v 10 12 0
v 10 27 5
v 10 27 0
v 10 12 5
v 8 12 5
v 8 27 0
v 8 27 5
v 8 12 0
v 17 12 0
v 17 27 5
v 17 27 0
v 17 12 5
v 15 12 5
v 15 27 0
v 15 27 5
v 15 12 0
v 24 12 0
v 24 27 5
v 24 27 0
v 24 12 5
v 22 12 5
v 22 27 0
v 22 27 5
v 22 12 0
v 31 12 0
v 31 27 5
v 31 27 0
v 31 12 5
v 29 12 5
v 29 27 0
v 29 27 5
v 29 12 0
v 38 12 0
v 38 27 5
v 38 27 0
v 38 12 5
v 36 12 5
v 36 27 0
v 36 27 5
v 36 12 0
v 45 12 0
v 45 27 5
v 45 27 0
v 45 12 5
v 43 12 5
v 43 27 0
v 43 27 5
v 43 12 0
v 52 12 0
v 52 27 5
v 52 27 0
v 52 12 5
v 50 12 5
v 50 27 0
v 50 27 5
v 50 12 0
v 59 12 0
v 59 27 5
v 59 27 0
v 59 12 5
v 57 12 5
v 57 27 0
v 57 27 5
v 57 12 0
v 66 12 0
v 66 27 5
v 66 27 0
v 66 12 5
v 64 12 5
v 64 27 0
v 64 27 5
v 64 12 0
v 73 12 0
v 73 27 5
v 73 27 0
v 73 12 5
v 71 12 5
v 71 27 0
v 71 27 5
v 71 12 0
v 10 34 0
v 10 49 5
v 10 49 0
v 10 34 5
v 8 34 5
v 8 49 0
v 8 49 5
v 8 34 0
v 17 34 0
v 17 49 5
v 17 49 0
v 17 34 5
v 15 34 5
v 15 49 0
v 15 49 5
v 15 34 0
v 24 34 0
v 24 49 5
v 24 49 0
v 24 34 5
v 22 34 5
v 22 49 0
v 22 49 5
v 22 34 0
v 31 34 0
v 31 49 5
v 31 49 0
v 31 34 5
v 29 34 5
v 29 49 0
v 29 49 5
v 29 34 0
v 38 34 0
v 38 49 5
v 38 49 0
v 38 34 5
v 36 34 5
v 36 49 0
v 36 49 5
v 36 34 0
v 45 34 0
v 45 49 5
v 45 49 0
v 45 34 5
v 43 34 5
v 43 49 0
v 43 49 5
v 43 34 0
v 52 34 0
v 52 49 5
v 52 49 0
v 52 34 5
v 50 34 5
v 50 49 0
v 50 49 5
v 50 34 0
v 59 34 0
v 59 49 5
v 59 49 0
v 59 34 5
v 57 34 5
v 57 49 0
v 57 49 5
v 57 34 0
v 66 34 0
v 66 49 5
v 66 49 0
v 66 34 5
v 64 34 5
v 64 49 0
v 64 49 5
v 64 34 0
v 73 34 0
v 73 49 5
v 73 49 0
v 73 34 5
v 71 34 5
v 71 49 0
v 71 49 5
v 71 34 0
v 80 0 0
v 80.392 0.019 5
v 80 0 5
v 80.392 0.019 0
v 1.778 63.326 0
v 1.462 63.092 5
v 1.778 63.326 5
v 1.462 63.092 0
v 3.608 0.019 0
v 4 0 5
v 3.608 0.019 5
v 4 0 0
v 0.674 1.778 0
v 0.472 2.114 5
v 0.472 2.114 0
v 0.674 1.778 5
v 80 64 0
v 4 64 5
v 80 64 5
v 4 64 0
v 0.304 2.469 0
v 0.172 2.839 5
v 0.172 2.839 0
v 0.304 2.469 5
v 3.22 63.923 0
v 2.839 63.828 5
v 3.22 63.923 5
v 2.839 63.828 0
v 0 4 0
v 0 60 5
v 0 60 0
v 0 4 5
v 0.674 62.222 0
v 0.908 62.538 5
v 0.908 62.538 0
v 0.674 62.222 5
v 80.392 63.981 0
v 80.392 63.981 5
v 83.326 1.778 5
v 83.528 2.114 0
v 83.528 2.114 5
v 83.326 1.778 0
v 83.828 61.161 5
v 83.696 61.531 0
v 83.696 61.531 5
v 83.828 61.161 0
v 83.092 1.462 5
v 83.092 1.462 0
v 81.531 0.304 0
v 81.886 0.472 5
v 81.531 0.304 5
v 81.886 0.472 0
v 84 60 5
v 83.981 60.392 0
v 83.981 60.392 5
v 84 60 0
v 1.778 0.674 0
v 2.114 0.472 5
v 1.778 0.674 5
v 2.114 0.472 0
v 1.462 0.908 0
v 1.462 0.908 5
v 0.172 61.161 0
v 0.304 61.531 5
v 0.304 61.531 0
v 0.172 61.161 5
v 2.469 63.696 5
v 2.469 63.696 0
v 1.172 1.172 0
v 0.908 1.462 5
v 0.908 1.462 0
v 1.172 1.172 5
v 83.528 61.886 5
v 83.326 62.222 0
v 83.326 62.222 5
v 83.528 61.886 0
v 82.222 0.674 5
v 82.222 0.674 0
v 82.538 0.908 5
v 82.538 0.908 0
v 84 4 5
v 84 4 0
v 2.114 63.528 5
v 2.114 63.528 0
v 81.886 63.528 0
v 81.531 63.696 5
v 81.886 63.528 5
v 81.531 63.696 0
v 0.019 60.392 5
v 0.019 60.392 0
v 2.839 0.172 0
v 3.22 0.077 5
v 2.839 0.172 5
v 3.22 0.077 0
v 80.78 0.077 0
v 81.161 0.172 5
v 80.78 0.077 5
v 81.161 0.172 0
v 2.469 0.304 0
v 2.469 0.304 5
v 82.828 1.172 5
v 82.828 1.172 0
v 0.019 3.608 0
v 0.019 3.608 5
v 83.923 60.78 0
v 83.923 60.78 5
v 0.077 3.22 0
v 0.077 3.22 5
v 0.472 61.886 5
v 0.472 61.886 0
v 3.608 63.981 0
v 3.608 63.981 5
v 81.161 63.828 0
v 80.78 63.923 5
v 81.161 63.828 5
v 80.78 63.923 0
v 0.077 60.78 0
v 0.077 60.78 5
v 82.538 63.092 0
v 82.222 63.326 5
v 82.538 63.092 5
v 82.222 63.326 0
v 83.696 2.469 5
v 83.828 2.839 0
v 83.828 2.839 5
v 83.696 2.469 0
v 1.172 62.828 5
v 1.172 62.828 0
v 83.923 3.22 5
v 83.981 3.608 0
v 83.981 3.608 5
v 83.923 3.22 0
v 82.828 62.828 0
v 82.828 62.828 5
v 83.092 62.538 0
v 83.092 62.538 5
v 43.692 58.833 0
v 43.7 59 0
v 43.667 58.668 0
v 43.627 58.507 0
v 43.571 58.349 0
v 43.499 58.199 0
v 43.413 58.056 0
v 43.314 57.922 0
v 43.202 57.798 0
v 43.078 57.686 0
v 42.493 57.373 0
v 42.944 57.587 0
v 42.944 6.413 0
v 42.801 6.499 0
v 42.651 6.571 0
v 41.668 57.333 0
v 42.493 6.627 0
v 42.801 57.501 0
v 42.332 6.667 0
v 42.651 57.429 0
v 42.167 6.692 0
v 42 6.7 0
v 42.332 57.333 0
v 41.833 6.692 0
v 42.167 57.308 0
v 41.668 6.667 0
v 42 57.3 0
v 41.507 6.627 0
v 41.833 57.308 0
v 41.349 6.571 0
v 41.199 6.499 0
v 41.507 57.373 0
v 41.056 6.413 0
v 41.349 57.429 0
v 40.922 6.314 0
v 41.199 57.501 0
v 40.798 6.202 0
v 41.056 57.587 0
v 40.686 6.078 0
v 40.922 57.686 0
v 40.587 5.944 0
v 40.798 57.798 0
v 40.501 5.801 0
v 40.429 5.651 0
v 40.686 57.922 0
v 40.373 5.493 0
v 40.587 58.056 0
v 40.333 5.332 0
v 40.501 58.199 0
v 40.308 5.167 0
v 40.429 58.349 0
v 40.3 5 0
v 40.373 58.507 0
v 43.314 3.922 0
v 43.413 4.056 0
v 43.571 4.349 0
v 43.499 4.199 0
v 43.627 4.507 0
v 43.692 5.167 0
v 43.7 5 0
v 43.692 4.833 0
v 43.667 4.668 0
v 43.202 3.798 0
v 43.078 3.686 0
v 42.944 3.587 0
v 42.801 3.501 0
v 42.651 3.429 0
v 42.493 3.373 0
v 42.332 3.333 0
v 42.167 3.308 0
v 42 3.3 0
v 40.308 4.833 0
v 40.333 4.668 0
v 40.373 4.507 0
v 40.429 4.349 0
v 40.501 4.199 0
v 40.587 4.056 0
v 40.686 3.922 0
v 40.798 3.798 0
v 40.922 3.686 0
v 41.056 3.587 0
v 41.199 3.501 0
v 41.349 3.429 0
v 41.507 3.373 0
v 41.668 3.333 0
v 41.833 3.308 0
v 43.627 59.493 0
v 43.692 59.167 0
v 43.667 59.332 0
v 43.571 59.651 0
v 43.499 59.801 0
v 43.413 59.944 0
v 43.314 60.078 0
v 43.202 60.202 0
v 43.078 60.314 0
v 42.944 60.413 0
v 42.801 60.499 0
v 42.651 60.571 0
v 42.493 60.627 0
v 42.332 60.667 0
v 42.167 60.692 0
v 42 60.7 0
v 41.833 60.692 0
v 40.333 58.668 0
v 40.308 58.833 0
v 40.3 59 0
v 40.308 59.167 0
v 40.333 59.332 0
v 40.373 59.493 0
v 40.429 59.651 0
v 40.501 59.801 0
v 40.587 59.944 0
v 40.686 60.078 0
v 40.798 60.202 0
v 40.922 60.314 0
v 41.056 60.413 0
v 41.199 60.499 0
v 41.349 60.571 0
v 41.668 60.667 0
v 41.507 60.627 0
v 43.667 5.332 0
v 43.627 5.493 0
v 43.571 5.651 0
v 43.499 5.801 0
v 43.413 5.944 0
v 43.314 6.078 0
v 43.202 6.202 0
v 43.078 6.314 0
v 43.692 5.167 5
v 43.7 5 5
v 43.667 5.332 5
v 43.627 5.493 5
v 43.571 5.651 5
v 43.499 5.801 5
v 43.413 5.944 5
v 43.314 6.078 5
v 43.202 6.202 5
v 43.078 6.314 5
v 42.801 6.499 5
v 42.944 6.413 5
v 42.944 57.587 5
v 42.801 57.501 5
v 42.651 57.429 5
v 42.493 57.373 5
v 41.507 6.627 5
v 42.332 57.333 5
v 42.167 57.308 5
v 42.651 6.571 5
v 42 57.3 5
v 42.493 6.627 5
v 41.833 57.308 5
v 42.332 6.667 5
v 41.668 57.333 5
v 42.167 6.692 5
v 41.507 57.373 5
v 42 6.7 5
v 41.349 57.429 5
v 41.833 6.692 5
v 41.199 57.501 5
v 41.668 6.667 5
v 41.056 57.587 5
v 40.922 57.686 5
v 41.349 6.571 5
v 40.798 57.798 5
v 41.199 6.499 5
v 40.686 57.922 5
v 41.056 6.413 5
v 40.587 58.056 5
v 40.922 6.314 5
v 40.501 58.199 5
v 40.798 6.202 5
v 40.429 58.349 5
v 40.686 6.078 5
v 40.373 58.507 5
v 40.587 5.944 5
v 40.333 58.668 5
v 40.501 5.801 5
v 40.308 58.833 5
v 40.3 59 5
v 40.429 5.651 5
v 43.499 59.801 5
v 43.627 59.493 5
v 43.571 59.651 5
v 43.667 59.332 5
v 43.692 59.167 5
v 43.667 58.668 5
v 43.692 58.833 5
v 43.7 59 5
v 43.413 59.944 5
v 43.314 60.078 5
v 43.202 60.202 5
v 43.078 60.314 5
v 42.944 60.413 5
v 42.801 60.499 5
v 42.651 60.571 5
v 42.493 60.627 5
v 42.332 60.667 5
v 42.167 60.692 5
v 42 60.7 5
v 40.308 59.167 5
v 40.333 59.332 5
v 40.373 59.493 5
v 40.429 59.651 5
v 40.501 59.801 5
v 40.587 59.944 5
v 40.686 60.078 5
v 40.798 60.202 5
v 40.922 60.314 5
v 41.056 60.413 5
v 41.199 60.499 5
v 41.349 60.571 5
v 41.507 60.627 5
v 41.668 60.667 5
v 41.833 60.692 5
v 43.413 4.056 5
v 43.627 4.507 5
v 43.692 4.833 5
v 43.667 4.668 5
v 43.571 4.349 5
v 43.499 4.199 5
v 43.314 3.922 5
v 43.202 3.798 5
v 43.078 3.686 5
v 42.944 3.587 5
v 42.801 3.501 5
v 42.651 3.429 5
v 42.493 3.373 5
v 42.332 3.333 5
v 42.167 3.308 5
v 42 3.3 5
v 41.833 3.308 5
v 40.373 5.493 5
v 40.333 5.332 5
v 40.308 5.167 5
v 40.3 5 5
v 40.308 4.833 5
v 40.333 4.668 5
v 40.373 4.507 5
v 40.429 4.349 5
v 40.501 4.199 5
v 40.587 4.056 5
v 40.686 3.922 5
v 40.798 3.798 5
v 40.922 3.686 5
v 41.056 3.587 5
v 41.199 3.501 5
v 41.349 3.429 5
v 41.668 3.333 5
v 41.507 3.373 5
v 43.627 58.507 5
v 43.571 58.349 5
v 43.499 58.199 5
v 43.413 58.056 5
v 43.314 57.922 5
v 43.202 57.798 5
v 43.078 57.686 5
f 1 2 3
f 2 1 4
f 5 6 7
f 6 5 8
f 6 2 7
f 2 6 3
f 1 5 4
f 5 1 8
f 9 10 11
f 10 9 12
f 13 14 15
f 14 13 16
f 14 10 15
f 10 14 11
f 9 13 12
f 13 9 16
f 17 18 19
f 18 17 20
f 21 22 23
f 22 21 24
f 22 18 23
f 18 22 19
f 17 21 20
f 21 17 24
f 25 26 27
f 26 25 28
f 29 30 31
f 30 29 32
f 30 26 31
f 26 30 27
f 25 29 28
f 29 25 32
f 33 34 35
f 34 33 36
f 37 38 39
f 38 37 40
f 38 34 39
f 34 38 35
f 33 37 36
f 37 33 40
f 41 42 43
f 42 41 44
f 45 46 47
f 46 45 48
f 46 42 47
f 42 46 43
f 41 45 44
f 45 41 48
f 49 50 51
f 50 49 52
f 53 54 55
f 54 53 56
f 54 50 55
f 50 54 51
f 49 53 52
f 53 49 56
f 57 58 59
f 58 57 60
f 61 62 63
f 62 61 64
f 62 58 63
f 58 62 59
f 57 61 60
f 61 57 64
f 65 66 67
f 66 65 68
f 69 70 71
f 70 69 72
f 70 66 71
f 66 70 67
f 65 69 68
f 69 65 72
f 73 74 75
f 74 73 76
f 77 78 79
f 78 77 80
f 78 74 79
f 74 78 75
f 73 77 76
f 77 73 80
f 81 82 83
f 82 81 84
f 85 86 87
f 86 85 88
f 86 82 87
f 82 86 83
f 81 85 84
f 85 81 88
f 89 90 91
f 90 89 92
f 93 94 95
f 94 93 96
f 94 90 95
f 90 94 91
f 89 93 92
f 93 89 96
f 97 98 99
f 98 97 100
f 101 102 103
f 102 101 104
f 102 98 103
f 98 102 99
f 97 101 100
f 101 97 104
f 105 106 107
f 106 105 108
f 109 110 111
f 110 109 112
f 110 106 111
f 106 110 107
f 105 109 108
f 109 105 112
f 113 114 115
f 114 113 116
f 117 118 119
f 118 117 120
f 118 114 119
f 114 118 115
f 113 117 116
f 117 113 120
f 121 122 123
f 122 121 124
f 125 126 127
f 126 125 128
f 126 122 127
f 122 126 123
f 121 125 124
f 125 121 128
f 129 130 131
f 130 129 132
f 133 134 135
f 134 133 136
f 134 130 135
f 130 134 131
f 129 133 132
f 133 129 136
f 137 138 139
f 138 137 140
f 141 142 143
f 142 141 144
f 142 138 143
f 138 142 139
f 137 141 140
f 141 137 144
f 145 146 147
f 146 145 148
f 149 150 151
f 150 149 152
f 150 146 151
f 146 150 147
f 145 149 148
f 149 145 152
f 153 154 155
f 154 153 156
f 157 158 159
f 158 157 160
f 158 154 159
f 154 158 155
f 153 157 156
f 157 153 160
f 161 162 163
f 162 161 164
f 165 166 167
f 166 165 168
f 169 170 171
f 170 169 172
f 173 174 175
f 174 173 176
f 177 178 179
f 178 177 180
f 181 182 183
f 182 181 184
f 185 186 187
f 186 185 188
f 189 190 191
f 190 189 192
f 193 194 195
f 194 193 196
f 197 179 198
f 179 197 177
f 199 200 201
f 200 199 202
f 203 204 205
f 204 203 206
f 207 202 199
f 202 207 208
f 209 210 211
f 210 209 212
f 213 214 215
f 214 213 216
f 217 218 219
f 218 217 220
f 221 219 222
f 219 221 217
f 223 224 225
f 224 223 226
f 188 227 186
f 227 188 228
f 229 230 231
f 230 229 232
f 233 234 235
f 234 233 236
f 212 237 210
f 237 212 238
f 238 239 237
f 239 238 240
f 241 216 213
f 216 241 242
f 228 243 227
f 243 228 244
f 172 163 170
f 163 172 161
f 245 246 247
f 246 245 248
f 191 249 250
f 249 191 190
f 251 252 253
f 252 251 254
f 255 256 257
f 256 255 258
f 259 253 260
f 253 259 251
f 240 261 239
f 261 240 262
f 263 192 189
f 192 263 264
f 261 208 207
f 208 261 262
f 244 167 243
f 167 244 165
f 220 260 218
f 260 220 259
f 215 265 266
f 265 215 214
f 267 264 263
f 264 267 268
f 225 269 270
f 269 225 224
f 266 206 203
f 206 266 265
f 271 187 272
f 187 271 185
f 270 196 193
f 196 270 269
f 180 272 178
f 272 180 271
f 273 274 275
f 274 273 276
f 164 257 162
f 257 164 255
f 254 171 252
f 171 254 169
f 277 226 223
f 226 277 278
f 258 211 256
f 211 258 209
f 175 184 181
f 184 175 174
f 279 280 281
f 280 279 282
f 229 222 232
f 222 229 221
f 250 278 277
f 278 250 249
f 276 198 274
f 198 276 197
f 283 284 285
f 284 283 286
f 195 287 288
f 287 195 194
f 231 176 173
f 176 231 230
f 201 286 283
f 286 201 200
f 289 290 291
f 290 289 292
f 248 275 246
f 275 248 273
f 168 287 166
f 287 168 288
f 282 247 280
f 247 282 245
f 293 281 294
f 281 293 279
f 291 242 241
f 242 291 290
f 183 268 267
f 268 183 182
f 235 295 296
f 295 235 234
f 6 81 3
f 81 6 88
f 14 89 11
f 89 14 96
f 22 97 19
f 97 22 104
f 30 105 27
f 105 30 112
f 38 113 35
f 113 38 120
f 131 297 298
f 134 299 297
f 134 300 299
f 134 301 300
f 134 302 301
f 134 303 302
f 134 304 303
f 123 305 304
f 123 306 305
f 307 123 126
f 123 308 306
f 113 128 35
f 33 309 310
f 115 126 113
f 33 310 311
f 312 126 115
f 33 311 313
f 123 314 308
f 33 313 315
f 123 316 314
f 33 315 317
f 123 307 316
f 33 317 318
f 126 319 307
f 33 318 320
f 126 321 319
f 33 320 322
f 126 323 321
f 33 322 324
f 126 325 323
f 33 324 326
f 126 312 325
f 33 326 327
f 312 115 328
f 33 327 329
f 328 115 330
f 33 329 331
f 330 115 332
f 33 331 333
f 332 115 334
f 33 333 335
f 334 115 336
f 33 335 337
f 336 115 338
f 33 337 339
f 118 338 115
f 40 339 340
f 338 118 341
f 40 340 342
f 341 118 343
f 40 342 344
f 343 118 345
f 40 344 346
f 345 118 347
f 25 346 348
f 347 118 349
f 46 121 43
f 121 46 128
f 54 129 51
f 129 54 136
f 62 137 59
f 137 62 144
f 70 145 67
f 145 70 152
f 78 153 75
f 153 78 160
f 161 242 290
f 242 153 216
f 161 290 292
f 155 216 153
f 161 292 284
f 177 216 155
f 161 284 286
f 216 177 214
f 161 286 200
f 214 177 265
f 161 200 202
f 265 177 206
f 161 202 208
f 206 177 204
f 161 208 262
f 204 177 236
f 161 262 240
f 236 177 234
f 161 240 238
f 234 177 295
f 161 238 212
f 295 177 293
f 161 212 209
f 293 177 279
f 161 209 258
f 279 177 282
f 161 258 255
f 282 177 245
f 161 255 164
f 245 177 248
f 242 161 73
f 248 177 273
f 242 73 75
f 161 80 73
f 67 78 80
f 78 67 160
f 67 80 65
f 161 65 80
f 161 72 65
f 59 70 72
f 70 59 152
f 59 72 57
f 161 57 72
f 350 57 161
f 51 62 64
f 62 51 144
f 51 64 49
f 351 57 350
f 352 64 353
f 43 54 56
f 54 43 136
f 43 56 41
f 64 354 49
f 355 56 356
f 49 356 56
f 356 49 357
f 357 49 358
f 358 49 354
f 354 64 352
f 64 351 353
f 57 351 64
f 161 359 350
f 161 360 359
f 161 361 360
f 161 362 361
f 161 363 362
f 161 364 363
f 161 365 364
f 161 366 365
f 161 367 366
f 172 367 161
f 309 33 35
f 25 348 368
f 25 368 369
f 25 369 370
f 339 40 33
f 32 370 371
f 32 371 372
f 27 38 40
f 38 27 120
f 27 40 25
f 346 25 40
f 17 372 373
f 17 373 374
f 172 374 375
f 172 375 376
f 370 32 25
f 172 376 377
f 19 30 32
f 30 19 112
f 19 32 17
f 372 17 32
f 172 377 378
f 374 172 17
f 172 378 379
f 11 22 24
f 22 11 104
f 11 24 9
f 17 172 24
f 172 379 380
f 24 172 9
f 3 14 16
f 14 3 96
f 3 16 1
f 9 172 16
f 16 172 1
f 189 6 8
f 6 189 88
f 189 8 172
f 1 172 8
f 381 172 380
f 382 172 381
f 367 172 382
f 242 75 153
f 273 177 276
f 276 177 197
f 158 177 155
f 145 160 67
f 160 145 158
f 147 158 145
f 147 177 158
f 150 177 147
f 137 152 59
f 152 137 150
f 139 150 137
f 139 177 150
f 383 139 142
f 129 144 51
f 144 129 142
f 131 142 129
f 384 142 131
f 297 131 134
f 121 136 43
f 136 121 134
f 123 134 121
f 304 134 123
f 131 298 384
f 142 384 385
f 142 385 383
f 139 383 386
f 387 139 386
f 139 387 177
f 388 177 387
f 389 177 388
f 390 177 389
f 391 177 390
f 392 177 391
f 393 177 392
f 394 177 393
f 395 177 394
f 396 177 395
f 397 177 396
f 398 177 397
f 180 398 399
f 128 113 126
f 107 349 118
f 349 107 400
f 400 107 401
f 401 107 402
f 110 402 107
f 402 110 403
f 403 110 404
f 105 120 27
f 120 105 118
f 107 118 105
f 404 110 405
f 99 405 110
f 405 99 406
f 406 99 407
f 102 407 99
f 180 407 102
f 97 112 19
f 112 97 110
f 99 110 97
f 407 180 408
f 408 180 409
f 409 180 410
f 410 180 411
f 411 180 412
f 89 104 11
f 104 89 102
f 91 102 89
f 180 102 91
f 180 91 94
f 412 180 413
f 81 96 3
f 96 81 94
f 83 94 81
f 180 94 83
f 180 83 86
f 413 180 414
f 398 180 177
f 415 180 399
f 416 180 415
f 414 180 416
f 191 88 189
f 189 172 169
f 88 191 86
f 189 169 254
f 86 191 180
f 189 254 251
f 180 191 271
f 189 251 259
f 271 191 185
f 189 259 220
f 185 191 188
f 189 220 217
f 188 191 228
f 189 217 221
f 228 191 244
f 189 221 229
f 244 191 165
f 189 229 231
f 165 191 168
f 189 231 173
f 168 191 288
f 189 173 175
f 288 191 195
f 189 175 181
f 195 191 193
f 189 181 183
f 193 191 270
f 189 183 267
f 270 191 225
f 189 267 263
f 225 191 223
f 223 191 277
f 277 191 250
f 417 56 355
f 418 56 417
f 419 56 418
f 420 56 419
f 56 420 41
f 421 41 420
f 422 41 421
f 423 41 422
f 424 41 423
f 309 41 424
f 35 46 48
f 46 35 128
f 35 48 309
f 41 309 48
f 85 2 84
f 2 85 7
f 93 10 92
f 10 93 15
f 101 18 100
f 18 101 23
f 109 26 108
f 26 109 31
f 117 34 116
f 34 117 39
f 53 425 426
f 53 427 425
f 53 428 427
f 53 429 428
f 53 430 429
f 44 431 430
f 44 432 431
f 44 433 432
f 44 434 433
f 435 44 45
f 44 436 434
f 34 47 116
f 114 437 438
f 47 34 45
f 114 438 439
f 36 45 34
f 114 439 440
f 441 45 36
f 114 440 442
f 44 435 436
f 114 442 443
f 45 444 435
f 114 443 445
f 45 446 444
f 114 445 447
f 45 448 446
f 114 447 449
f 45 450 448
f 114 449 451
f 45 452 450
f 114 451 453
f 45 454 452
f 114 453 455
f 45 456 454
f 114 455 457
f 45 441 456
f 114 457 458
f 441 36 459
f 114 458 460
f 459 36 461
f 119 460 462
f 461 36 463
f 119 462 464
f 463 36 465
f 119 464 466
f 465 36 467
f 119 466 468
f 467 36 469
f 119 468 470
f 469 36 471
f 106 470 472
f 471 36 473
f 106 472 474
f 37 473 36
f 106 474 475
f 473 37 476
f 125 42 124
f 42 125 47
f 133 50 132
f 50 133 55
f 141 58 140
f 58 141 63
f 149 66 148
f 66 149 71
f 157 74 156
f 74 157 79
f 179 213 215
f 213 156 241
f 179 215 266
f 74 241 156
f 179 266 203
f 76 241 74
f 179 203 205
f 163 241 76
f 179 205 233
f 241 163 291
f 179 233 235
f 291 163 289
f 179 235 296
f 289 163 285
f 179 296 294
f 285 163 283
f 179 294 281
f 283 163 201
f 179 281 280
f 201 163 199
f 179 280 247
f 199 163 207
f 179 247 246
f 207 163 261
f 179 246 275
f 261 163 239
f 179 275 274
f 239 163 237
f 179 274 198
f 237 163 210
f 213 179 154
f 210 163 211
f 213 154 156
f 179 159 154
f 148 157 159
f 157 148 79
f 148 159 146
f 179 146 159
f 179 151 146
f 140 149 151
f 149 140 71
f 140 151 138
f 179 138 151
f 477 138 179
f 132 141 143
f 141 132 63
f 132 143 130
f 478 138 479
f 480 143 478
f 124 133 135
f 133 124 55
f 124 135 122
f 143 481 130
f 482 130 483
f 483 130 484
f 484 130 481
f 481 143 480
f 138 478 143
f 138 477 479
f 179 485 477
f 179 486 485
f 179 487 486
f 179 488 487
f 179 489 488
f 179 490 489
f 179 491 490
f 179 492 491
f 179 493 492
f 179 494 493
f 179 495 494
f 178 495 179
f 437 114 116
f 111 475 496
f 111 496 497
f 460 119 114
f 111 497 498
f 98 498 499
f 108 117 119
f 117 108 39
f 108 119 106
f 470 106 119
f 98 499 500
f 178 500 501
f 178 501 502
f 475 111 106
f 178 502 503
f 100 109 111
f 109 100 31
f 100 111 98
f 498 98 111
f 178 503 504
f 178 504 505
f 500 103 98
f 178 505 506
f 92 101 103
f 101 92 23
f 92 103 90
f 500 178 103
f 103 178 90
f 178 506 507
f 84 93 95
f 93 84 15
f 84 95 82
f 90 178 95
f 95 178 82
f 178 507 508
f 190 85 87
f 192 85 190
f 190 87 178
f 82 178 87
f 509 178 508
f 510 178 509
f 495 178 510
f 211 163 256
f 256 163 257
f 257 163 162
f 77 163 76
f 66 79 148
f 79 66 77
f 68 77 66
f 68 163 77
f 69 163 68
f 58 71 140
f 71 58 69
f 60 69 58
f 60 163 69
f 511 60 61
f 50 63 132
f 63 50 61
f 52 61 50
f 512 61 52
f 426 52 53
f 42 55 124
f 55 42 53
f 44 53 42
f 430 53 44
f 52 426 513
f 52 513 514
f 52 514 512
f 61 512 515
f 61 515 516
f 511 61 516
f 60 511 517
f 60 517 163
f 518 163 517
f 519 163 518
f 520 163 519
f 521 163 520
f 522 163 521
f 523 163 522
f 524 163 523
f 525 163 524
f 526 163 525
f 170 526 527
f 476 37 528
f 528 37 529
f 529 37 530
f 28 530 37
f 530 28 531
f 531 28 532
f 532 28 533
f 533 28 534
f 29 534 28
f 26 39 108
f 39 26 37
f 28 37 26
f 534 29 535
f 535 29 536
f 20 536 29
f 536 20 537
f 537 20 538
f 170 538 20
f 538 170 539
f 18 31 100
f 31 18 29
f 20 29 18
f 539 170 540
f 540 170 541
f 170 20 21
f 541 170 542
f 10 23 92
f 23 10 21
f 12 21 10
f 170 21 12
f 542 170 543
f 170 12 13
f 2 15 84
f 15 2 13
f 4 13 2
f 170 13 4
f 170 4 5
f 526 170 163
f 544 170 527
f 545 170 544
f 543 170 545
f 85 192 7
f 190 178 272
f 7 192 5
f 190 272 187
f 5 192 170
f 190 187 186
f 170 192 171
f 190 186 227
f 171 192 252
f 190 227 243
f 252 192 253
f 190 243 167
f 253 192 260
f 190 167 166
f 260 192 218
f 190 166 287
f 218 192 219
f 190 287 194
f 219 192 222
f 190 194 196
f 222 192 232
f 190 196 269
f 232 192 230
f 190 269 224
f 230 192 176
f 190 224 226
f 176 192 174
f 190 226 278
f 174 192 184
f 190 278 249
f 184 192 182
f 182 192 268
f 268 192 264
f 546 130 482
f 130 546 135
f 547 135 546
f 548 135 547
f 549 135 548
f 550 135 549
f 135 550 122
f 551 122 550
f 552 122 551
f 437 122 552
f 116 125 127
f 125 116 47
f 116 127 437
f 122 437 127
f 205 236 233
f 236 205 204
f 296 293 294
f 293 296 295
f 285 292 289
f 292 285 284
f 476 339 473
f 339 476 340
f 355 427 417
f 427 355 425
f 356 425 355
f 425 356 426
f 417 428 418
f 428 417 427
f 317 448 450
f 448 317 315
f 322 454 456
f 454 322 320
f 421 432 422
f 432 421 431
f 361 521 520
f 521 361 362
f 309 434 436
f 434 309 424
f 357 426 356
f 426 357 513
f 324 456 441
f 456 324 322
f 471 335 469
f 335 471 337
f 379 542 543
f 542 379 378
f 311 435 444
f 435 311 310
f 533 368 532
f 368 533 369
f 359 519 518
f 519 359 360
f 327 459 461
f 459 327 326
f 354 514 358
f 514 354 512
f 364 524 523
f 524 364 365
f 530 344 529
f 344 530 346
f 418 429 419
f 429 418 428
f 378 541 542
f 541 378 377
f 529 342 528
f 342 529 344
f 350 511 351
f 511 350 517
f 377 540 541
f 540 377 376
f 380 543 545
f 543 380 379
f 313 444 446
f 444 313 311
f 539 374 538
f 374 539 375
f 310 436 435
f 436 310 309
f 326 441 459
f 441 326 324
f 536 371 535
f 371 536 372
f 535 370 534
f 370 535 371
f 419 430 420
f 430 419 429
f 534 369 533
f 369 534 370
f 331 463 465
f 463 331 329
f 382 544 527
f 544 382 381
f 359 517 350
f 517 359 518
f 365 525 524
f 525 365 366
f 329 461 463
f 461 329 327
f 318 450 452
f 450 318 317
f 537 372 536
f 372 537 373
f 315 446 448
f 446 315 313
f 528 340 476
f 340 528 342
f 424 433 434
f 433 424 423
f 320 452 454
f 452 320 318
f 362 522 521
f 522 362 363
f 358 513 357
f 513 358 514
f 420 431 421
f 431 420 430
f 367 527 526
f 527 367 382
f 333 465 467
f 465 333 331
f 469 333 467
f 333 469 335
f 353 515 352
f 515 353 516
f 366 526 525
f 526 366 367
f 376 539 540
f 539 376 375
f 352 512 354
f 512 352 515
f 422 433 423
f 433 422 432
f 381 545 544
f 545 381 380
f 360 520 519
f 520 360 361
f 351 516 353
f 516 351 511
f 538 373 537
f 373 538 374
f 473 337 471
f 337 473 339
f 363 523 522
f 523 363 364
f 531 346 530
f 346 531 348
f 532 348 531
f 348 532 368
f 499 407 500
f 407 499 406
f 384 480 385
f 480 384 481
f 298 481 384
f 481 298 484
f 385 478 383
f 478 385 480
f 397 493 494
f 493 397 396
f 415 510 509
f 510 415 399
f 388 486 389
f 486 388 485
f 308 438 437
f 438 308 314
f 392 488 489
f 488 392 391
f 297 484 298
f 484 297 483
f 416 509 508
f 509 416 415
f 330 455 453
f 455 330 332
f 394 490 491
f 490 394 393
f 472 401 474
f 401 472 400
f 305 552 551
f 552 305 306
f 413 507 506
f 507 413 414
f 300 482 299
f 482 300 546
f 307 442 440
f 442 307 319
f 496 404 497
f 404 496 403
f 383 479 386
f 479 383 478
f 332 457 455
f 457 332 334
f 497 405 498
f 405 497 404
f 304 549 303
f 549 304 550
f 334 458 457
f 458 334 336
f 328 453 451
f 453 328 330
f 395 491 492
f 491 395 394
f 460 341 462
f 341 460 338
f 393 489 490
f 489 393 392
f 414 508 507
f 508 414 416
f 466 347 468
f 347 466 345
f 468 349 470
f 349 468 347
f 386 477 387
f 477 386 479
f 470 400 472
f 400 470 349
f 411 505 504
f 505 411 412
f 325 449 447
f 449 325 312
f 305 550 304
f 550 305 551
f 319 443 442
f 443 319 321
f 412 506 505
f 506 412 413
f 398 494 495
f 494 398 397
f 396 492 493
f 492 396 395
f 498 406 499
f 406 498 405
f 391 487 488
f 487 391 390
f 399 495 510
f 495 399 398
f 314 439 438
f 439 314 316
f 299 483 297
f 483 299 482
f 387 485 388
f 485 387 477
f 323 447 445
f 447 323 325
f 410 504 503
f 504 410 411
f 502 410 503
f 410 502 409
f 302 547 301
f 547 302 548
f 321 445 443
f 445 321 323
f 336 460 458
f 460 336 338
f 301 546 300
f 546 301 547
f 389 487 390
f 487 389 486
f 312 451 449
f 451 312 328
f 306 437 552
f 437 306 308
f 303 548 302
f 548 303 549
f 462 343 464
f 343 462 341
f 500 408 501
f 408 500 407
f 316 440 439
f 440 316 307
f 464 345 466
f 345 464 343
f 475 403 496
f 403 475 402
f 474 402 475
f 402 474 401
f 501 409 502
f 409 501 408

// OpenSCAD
// file: params.scad
// Cat Feeder 5000 — Shared Parameters & Common Modules
// Include this file first in all part files: include <params.scad>

// ===== DIMENSIONS =====
WALL = 3;                // Standard wall thickness (mm)
THIN_WALL = 2.5;         // Thin walls (antenna arch, etc.)
FLOOR = 4;               // Base floor thickness
INSERT_BORE = 4.7;       // M3 heat-set insert pocket bore
M3_CLEAR = 3.4;          // M3 clearance hole
UNIT_W = 160;            // Main body width
UNIT_D = 240;            // Main body depth
UNIT_H = 160;            // Main body height
GATE_W = 118;            // Gate flap width
GATE_H = 90;             // Gate flap height
GATE_T = 3;              // Gate flap thickness
GATE_ROD_D = 3.2;        // Gate hinge rod diameter
ARCH_SPAN = 160;         // Antenna arch left-to-right span
ARCH_H = 70;             // Antenna arch height
ARCH_D = 40;             // Antenna arch depth (front-to-back)
COIL_CH_W = 16;          // Coil channel width
COIL_CH_D = 5;           // Coil channel depth
SERVO_W = 23;            // SG90 servo width
SERVO_D = 12.5;          // SG90 servo depth
SERVO_H = 30;            // SG90 servo height
SERVO_EAR_SPAN = 28;     // SG90 servo ear spacing
TOLERANCE = 0.1;         // General fit tolerance

// ===== RENDER QUALITY =====
$fn = 64;                // Circle resolution (smooth curves)

// ===== COLORS =====
COL_RFID = [0.8, 0.2, 0.2, 0.8];      // Red — RFID antenna arch
COL_TPU = [0.4, 0.7, 0.3, 0.8];       // Green — TPU flexible parts
COL_GATE = [0.2, 0.5, 0.8, 0.8];      // Blue — Gate mechanism
COL_BODY = [0.6, 0.6, 0.6, 0.8];      // Gray — Main body structure

// ===== COMMON MODULES =====

// M3 heat-set insert pocket (bore hole for pressed insert)
module m3_insert(h = 8) {
    cylinder(d = INSERT_BORE, h = h);
}

// M3 clearance hole (for bolt pass-through)
module m3_clear(h = 8) {
    cylinder(d = M3_CLEAR, h = h);
}

// Fillet box: rectangular box with filleted corners
// w, d, h = width, depth, height; r = corner radius
module fillet_box(w, d, h, r = 2) {
    hull() {
        translate([r, r, 0])
            cylinder(r = r, h = h);
        translate([w - r, r, 0])
            cylinder(r = r, h = h);
        translate([r, d - r, 0])
            cylinder(r = r, h = h);
        translate([w - r, d - r, 0])
            cylinder(r = r, h = h);
    }
}

// Boss: raised circular pad with M3 pocket
// Useful for internal reinforcement at bolt points
module boss(d = 10, h = 4, pocket = true) {
    difference() {
        cylinder(d = d, h = h);
        if (pocket)
            translate([0, 0, -0.1])
                m3_clear(h = h + 0.2);
    }
}
// main file
// Cat Feeder 5000 — Part 08: Electronics Cover
// Ventilated removable cover over electronics bay.
// Print: PETG, 0.2mm layers, 20% infill, no supports

include <params.scad>

color(COL_BODY) electronics_cover();

module electronics_cover() {
    CW = 84; CD = 64; CH = 5;

    difference() {
        fillet_box(CW, CD, CH, r=4);
        // Vent slots (2mm × 15mm, 3mm spacing)
        for (row=[0:1]) for (col=[0:9])
            translate([8 + col*7, 12 + row*22, -0.1])
                cube([2, 15, CH + 0.2]);
        // Retention screw holes (M3 clearance, 2× center sides)
        translate([CW/2, 5,  -0.1]) m3_clear(h=CH + 0.2);
        translate([CW/2, CD-5, -0.1]) m3_clear(h=CH + 0.2);
    }
}
